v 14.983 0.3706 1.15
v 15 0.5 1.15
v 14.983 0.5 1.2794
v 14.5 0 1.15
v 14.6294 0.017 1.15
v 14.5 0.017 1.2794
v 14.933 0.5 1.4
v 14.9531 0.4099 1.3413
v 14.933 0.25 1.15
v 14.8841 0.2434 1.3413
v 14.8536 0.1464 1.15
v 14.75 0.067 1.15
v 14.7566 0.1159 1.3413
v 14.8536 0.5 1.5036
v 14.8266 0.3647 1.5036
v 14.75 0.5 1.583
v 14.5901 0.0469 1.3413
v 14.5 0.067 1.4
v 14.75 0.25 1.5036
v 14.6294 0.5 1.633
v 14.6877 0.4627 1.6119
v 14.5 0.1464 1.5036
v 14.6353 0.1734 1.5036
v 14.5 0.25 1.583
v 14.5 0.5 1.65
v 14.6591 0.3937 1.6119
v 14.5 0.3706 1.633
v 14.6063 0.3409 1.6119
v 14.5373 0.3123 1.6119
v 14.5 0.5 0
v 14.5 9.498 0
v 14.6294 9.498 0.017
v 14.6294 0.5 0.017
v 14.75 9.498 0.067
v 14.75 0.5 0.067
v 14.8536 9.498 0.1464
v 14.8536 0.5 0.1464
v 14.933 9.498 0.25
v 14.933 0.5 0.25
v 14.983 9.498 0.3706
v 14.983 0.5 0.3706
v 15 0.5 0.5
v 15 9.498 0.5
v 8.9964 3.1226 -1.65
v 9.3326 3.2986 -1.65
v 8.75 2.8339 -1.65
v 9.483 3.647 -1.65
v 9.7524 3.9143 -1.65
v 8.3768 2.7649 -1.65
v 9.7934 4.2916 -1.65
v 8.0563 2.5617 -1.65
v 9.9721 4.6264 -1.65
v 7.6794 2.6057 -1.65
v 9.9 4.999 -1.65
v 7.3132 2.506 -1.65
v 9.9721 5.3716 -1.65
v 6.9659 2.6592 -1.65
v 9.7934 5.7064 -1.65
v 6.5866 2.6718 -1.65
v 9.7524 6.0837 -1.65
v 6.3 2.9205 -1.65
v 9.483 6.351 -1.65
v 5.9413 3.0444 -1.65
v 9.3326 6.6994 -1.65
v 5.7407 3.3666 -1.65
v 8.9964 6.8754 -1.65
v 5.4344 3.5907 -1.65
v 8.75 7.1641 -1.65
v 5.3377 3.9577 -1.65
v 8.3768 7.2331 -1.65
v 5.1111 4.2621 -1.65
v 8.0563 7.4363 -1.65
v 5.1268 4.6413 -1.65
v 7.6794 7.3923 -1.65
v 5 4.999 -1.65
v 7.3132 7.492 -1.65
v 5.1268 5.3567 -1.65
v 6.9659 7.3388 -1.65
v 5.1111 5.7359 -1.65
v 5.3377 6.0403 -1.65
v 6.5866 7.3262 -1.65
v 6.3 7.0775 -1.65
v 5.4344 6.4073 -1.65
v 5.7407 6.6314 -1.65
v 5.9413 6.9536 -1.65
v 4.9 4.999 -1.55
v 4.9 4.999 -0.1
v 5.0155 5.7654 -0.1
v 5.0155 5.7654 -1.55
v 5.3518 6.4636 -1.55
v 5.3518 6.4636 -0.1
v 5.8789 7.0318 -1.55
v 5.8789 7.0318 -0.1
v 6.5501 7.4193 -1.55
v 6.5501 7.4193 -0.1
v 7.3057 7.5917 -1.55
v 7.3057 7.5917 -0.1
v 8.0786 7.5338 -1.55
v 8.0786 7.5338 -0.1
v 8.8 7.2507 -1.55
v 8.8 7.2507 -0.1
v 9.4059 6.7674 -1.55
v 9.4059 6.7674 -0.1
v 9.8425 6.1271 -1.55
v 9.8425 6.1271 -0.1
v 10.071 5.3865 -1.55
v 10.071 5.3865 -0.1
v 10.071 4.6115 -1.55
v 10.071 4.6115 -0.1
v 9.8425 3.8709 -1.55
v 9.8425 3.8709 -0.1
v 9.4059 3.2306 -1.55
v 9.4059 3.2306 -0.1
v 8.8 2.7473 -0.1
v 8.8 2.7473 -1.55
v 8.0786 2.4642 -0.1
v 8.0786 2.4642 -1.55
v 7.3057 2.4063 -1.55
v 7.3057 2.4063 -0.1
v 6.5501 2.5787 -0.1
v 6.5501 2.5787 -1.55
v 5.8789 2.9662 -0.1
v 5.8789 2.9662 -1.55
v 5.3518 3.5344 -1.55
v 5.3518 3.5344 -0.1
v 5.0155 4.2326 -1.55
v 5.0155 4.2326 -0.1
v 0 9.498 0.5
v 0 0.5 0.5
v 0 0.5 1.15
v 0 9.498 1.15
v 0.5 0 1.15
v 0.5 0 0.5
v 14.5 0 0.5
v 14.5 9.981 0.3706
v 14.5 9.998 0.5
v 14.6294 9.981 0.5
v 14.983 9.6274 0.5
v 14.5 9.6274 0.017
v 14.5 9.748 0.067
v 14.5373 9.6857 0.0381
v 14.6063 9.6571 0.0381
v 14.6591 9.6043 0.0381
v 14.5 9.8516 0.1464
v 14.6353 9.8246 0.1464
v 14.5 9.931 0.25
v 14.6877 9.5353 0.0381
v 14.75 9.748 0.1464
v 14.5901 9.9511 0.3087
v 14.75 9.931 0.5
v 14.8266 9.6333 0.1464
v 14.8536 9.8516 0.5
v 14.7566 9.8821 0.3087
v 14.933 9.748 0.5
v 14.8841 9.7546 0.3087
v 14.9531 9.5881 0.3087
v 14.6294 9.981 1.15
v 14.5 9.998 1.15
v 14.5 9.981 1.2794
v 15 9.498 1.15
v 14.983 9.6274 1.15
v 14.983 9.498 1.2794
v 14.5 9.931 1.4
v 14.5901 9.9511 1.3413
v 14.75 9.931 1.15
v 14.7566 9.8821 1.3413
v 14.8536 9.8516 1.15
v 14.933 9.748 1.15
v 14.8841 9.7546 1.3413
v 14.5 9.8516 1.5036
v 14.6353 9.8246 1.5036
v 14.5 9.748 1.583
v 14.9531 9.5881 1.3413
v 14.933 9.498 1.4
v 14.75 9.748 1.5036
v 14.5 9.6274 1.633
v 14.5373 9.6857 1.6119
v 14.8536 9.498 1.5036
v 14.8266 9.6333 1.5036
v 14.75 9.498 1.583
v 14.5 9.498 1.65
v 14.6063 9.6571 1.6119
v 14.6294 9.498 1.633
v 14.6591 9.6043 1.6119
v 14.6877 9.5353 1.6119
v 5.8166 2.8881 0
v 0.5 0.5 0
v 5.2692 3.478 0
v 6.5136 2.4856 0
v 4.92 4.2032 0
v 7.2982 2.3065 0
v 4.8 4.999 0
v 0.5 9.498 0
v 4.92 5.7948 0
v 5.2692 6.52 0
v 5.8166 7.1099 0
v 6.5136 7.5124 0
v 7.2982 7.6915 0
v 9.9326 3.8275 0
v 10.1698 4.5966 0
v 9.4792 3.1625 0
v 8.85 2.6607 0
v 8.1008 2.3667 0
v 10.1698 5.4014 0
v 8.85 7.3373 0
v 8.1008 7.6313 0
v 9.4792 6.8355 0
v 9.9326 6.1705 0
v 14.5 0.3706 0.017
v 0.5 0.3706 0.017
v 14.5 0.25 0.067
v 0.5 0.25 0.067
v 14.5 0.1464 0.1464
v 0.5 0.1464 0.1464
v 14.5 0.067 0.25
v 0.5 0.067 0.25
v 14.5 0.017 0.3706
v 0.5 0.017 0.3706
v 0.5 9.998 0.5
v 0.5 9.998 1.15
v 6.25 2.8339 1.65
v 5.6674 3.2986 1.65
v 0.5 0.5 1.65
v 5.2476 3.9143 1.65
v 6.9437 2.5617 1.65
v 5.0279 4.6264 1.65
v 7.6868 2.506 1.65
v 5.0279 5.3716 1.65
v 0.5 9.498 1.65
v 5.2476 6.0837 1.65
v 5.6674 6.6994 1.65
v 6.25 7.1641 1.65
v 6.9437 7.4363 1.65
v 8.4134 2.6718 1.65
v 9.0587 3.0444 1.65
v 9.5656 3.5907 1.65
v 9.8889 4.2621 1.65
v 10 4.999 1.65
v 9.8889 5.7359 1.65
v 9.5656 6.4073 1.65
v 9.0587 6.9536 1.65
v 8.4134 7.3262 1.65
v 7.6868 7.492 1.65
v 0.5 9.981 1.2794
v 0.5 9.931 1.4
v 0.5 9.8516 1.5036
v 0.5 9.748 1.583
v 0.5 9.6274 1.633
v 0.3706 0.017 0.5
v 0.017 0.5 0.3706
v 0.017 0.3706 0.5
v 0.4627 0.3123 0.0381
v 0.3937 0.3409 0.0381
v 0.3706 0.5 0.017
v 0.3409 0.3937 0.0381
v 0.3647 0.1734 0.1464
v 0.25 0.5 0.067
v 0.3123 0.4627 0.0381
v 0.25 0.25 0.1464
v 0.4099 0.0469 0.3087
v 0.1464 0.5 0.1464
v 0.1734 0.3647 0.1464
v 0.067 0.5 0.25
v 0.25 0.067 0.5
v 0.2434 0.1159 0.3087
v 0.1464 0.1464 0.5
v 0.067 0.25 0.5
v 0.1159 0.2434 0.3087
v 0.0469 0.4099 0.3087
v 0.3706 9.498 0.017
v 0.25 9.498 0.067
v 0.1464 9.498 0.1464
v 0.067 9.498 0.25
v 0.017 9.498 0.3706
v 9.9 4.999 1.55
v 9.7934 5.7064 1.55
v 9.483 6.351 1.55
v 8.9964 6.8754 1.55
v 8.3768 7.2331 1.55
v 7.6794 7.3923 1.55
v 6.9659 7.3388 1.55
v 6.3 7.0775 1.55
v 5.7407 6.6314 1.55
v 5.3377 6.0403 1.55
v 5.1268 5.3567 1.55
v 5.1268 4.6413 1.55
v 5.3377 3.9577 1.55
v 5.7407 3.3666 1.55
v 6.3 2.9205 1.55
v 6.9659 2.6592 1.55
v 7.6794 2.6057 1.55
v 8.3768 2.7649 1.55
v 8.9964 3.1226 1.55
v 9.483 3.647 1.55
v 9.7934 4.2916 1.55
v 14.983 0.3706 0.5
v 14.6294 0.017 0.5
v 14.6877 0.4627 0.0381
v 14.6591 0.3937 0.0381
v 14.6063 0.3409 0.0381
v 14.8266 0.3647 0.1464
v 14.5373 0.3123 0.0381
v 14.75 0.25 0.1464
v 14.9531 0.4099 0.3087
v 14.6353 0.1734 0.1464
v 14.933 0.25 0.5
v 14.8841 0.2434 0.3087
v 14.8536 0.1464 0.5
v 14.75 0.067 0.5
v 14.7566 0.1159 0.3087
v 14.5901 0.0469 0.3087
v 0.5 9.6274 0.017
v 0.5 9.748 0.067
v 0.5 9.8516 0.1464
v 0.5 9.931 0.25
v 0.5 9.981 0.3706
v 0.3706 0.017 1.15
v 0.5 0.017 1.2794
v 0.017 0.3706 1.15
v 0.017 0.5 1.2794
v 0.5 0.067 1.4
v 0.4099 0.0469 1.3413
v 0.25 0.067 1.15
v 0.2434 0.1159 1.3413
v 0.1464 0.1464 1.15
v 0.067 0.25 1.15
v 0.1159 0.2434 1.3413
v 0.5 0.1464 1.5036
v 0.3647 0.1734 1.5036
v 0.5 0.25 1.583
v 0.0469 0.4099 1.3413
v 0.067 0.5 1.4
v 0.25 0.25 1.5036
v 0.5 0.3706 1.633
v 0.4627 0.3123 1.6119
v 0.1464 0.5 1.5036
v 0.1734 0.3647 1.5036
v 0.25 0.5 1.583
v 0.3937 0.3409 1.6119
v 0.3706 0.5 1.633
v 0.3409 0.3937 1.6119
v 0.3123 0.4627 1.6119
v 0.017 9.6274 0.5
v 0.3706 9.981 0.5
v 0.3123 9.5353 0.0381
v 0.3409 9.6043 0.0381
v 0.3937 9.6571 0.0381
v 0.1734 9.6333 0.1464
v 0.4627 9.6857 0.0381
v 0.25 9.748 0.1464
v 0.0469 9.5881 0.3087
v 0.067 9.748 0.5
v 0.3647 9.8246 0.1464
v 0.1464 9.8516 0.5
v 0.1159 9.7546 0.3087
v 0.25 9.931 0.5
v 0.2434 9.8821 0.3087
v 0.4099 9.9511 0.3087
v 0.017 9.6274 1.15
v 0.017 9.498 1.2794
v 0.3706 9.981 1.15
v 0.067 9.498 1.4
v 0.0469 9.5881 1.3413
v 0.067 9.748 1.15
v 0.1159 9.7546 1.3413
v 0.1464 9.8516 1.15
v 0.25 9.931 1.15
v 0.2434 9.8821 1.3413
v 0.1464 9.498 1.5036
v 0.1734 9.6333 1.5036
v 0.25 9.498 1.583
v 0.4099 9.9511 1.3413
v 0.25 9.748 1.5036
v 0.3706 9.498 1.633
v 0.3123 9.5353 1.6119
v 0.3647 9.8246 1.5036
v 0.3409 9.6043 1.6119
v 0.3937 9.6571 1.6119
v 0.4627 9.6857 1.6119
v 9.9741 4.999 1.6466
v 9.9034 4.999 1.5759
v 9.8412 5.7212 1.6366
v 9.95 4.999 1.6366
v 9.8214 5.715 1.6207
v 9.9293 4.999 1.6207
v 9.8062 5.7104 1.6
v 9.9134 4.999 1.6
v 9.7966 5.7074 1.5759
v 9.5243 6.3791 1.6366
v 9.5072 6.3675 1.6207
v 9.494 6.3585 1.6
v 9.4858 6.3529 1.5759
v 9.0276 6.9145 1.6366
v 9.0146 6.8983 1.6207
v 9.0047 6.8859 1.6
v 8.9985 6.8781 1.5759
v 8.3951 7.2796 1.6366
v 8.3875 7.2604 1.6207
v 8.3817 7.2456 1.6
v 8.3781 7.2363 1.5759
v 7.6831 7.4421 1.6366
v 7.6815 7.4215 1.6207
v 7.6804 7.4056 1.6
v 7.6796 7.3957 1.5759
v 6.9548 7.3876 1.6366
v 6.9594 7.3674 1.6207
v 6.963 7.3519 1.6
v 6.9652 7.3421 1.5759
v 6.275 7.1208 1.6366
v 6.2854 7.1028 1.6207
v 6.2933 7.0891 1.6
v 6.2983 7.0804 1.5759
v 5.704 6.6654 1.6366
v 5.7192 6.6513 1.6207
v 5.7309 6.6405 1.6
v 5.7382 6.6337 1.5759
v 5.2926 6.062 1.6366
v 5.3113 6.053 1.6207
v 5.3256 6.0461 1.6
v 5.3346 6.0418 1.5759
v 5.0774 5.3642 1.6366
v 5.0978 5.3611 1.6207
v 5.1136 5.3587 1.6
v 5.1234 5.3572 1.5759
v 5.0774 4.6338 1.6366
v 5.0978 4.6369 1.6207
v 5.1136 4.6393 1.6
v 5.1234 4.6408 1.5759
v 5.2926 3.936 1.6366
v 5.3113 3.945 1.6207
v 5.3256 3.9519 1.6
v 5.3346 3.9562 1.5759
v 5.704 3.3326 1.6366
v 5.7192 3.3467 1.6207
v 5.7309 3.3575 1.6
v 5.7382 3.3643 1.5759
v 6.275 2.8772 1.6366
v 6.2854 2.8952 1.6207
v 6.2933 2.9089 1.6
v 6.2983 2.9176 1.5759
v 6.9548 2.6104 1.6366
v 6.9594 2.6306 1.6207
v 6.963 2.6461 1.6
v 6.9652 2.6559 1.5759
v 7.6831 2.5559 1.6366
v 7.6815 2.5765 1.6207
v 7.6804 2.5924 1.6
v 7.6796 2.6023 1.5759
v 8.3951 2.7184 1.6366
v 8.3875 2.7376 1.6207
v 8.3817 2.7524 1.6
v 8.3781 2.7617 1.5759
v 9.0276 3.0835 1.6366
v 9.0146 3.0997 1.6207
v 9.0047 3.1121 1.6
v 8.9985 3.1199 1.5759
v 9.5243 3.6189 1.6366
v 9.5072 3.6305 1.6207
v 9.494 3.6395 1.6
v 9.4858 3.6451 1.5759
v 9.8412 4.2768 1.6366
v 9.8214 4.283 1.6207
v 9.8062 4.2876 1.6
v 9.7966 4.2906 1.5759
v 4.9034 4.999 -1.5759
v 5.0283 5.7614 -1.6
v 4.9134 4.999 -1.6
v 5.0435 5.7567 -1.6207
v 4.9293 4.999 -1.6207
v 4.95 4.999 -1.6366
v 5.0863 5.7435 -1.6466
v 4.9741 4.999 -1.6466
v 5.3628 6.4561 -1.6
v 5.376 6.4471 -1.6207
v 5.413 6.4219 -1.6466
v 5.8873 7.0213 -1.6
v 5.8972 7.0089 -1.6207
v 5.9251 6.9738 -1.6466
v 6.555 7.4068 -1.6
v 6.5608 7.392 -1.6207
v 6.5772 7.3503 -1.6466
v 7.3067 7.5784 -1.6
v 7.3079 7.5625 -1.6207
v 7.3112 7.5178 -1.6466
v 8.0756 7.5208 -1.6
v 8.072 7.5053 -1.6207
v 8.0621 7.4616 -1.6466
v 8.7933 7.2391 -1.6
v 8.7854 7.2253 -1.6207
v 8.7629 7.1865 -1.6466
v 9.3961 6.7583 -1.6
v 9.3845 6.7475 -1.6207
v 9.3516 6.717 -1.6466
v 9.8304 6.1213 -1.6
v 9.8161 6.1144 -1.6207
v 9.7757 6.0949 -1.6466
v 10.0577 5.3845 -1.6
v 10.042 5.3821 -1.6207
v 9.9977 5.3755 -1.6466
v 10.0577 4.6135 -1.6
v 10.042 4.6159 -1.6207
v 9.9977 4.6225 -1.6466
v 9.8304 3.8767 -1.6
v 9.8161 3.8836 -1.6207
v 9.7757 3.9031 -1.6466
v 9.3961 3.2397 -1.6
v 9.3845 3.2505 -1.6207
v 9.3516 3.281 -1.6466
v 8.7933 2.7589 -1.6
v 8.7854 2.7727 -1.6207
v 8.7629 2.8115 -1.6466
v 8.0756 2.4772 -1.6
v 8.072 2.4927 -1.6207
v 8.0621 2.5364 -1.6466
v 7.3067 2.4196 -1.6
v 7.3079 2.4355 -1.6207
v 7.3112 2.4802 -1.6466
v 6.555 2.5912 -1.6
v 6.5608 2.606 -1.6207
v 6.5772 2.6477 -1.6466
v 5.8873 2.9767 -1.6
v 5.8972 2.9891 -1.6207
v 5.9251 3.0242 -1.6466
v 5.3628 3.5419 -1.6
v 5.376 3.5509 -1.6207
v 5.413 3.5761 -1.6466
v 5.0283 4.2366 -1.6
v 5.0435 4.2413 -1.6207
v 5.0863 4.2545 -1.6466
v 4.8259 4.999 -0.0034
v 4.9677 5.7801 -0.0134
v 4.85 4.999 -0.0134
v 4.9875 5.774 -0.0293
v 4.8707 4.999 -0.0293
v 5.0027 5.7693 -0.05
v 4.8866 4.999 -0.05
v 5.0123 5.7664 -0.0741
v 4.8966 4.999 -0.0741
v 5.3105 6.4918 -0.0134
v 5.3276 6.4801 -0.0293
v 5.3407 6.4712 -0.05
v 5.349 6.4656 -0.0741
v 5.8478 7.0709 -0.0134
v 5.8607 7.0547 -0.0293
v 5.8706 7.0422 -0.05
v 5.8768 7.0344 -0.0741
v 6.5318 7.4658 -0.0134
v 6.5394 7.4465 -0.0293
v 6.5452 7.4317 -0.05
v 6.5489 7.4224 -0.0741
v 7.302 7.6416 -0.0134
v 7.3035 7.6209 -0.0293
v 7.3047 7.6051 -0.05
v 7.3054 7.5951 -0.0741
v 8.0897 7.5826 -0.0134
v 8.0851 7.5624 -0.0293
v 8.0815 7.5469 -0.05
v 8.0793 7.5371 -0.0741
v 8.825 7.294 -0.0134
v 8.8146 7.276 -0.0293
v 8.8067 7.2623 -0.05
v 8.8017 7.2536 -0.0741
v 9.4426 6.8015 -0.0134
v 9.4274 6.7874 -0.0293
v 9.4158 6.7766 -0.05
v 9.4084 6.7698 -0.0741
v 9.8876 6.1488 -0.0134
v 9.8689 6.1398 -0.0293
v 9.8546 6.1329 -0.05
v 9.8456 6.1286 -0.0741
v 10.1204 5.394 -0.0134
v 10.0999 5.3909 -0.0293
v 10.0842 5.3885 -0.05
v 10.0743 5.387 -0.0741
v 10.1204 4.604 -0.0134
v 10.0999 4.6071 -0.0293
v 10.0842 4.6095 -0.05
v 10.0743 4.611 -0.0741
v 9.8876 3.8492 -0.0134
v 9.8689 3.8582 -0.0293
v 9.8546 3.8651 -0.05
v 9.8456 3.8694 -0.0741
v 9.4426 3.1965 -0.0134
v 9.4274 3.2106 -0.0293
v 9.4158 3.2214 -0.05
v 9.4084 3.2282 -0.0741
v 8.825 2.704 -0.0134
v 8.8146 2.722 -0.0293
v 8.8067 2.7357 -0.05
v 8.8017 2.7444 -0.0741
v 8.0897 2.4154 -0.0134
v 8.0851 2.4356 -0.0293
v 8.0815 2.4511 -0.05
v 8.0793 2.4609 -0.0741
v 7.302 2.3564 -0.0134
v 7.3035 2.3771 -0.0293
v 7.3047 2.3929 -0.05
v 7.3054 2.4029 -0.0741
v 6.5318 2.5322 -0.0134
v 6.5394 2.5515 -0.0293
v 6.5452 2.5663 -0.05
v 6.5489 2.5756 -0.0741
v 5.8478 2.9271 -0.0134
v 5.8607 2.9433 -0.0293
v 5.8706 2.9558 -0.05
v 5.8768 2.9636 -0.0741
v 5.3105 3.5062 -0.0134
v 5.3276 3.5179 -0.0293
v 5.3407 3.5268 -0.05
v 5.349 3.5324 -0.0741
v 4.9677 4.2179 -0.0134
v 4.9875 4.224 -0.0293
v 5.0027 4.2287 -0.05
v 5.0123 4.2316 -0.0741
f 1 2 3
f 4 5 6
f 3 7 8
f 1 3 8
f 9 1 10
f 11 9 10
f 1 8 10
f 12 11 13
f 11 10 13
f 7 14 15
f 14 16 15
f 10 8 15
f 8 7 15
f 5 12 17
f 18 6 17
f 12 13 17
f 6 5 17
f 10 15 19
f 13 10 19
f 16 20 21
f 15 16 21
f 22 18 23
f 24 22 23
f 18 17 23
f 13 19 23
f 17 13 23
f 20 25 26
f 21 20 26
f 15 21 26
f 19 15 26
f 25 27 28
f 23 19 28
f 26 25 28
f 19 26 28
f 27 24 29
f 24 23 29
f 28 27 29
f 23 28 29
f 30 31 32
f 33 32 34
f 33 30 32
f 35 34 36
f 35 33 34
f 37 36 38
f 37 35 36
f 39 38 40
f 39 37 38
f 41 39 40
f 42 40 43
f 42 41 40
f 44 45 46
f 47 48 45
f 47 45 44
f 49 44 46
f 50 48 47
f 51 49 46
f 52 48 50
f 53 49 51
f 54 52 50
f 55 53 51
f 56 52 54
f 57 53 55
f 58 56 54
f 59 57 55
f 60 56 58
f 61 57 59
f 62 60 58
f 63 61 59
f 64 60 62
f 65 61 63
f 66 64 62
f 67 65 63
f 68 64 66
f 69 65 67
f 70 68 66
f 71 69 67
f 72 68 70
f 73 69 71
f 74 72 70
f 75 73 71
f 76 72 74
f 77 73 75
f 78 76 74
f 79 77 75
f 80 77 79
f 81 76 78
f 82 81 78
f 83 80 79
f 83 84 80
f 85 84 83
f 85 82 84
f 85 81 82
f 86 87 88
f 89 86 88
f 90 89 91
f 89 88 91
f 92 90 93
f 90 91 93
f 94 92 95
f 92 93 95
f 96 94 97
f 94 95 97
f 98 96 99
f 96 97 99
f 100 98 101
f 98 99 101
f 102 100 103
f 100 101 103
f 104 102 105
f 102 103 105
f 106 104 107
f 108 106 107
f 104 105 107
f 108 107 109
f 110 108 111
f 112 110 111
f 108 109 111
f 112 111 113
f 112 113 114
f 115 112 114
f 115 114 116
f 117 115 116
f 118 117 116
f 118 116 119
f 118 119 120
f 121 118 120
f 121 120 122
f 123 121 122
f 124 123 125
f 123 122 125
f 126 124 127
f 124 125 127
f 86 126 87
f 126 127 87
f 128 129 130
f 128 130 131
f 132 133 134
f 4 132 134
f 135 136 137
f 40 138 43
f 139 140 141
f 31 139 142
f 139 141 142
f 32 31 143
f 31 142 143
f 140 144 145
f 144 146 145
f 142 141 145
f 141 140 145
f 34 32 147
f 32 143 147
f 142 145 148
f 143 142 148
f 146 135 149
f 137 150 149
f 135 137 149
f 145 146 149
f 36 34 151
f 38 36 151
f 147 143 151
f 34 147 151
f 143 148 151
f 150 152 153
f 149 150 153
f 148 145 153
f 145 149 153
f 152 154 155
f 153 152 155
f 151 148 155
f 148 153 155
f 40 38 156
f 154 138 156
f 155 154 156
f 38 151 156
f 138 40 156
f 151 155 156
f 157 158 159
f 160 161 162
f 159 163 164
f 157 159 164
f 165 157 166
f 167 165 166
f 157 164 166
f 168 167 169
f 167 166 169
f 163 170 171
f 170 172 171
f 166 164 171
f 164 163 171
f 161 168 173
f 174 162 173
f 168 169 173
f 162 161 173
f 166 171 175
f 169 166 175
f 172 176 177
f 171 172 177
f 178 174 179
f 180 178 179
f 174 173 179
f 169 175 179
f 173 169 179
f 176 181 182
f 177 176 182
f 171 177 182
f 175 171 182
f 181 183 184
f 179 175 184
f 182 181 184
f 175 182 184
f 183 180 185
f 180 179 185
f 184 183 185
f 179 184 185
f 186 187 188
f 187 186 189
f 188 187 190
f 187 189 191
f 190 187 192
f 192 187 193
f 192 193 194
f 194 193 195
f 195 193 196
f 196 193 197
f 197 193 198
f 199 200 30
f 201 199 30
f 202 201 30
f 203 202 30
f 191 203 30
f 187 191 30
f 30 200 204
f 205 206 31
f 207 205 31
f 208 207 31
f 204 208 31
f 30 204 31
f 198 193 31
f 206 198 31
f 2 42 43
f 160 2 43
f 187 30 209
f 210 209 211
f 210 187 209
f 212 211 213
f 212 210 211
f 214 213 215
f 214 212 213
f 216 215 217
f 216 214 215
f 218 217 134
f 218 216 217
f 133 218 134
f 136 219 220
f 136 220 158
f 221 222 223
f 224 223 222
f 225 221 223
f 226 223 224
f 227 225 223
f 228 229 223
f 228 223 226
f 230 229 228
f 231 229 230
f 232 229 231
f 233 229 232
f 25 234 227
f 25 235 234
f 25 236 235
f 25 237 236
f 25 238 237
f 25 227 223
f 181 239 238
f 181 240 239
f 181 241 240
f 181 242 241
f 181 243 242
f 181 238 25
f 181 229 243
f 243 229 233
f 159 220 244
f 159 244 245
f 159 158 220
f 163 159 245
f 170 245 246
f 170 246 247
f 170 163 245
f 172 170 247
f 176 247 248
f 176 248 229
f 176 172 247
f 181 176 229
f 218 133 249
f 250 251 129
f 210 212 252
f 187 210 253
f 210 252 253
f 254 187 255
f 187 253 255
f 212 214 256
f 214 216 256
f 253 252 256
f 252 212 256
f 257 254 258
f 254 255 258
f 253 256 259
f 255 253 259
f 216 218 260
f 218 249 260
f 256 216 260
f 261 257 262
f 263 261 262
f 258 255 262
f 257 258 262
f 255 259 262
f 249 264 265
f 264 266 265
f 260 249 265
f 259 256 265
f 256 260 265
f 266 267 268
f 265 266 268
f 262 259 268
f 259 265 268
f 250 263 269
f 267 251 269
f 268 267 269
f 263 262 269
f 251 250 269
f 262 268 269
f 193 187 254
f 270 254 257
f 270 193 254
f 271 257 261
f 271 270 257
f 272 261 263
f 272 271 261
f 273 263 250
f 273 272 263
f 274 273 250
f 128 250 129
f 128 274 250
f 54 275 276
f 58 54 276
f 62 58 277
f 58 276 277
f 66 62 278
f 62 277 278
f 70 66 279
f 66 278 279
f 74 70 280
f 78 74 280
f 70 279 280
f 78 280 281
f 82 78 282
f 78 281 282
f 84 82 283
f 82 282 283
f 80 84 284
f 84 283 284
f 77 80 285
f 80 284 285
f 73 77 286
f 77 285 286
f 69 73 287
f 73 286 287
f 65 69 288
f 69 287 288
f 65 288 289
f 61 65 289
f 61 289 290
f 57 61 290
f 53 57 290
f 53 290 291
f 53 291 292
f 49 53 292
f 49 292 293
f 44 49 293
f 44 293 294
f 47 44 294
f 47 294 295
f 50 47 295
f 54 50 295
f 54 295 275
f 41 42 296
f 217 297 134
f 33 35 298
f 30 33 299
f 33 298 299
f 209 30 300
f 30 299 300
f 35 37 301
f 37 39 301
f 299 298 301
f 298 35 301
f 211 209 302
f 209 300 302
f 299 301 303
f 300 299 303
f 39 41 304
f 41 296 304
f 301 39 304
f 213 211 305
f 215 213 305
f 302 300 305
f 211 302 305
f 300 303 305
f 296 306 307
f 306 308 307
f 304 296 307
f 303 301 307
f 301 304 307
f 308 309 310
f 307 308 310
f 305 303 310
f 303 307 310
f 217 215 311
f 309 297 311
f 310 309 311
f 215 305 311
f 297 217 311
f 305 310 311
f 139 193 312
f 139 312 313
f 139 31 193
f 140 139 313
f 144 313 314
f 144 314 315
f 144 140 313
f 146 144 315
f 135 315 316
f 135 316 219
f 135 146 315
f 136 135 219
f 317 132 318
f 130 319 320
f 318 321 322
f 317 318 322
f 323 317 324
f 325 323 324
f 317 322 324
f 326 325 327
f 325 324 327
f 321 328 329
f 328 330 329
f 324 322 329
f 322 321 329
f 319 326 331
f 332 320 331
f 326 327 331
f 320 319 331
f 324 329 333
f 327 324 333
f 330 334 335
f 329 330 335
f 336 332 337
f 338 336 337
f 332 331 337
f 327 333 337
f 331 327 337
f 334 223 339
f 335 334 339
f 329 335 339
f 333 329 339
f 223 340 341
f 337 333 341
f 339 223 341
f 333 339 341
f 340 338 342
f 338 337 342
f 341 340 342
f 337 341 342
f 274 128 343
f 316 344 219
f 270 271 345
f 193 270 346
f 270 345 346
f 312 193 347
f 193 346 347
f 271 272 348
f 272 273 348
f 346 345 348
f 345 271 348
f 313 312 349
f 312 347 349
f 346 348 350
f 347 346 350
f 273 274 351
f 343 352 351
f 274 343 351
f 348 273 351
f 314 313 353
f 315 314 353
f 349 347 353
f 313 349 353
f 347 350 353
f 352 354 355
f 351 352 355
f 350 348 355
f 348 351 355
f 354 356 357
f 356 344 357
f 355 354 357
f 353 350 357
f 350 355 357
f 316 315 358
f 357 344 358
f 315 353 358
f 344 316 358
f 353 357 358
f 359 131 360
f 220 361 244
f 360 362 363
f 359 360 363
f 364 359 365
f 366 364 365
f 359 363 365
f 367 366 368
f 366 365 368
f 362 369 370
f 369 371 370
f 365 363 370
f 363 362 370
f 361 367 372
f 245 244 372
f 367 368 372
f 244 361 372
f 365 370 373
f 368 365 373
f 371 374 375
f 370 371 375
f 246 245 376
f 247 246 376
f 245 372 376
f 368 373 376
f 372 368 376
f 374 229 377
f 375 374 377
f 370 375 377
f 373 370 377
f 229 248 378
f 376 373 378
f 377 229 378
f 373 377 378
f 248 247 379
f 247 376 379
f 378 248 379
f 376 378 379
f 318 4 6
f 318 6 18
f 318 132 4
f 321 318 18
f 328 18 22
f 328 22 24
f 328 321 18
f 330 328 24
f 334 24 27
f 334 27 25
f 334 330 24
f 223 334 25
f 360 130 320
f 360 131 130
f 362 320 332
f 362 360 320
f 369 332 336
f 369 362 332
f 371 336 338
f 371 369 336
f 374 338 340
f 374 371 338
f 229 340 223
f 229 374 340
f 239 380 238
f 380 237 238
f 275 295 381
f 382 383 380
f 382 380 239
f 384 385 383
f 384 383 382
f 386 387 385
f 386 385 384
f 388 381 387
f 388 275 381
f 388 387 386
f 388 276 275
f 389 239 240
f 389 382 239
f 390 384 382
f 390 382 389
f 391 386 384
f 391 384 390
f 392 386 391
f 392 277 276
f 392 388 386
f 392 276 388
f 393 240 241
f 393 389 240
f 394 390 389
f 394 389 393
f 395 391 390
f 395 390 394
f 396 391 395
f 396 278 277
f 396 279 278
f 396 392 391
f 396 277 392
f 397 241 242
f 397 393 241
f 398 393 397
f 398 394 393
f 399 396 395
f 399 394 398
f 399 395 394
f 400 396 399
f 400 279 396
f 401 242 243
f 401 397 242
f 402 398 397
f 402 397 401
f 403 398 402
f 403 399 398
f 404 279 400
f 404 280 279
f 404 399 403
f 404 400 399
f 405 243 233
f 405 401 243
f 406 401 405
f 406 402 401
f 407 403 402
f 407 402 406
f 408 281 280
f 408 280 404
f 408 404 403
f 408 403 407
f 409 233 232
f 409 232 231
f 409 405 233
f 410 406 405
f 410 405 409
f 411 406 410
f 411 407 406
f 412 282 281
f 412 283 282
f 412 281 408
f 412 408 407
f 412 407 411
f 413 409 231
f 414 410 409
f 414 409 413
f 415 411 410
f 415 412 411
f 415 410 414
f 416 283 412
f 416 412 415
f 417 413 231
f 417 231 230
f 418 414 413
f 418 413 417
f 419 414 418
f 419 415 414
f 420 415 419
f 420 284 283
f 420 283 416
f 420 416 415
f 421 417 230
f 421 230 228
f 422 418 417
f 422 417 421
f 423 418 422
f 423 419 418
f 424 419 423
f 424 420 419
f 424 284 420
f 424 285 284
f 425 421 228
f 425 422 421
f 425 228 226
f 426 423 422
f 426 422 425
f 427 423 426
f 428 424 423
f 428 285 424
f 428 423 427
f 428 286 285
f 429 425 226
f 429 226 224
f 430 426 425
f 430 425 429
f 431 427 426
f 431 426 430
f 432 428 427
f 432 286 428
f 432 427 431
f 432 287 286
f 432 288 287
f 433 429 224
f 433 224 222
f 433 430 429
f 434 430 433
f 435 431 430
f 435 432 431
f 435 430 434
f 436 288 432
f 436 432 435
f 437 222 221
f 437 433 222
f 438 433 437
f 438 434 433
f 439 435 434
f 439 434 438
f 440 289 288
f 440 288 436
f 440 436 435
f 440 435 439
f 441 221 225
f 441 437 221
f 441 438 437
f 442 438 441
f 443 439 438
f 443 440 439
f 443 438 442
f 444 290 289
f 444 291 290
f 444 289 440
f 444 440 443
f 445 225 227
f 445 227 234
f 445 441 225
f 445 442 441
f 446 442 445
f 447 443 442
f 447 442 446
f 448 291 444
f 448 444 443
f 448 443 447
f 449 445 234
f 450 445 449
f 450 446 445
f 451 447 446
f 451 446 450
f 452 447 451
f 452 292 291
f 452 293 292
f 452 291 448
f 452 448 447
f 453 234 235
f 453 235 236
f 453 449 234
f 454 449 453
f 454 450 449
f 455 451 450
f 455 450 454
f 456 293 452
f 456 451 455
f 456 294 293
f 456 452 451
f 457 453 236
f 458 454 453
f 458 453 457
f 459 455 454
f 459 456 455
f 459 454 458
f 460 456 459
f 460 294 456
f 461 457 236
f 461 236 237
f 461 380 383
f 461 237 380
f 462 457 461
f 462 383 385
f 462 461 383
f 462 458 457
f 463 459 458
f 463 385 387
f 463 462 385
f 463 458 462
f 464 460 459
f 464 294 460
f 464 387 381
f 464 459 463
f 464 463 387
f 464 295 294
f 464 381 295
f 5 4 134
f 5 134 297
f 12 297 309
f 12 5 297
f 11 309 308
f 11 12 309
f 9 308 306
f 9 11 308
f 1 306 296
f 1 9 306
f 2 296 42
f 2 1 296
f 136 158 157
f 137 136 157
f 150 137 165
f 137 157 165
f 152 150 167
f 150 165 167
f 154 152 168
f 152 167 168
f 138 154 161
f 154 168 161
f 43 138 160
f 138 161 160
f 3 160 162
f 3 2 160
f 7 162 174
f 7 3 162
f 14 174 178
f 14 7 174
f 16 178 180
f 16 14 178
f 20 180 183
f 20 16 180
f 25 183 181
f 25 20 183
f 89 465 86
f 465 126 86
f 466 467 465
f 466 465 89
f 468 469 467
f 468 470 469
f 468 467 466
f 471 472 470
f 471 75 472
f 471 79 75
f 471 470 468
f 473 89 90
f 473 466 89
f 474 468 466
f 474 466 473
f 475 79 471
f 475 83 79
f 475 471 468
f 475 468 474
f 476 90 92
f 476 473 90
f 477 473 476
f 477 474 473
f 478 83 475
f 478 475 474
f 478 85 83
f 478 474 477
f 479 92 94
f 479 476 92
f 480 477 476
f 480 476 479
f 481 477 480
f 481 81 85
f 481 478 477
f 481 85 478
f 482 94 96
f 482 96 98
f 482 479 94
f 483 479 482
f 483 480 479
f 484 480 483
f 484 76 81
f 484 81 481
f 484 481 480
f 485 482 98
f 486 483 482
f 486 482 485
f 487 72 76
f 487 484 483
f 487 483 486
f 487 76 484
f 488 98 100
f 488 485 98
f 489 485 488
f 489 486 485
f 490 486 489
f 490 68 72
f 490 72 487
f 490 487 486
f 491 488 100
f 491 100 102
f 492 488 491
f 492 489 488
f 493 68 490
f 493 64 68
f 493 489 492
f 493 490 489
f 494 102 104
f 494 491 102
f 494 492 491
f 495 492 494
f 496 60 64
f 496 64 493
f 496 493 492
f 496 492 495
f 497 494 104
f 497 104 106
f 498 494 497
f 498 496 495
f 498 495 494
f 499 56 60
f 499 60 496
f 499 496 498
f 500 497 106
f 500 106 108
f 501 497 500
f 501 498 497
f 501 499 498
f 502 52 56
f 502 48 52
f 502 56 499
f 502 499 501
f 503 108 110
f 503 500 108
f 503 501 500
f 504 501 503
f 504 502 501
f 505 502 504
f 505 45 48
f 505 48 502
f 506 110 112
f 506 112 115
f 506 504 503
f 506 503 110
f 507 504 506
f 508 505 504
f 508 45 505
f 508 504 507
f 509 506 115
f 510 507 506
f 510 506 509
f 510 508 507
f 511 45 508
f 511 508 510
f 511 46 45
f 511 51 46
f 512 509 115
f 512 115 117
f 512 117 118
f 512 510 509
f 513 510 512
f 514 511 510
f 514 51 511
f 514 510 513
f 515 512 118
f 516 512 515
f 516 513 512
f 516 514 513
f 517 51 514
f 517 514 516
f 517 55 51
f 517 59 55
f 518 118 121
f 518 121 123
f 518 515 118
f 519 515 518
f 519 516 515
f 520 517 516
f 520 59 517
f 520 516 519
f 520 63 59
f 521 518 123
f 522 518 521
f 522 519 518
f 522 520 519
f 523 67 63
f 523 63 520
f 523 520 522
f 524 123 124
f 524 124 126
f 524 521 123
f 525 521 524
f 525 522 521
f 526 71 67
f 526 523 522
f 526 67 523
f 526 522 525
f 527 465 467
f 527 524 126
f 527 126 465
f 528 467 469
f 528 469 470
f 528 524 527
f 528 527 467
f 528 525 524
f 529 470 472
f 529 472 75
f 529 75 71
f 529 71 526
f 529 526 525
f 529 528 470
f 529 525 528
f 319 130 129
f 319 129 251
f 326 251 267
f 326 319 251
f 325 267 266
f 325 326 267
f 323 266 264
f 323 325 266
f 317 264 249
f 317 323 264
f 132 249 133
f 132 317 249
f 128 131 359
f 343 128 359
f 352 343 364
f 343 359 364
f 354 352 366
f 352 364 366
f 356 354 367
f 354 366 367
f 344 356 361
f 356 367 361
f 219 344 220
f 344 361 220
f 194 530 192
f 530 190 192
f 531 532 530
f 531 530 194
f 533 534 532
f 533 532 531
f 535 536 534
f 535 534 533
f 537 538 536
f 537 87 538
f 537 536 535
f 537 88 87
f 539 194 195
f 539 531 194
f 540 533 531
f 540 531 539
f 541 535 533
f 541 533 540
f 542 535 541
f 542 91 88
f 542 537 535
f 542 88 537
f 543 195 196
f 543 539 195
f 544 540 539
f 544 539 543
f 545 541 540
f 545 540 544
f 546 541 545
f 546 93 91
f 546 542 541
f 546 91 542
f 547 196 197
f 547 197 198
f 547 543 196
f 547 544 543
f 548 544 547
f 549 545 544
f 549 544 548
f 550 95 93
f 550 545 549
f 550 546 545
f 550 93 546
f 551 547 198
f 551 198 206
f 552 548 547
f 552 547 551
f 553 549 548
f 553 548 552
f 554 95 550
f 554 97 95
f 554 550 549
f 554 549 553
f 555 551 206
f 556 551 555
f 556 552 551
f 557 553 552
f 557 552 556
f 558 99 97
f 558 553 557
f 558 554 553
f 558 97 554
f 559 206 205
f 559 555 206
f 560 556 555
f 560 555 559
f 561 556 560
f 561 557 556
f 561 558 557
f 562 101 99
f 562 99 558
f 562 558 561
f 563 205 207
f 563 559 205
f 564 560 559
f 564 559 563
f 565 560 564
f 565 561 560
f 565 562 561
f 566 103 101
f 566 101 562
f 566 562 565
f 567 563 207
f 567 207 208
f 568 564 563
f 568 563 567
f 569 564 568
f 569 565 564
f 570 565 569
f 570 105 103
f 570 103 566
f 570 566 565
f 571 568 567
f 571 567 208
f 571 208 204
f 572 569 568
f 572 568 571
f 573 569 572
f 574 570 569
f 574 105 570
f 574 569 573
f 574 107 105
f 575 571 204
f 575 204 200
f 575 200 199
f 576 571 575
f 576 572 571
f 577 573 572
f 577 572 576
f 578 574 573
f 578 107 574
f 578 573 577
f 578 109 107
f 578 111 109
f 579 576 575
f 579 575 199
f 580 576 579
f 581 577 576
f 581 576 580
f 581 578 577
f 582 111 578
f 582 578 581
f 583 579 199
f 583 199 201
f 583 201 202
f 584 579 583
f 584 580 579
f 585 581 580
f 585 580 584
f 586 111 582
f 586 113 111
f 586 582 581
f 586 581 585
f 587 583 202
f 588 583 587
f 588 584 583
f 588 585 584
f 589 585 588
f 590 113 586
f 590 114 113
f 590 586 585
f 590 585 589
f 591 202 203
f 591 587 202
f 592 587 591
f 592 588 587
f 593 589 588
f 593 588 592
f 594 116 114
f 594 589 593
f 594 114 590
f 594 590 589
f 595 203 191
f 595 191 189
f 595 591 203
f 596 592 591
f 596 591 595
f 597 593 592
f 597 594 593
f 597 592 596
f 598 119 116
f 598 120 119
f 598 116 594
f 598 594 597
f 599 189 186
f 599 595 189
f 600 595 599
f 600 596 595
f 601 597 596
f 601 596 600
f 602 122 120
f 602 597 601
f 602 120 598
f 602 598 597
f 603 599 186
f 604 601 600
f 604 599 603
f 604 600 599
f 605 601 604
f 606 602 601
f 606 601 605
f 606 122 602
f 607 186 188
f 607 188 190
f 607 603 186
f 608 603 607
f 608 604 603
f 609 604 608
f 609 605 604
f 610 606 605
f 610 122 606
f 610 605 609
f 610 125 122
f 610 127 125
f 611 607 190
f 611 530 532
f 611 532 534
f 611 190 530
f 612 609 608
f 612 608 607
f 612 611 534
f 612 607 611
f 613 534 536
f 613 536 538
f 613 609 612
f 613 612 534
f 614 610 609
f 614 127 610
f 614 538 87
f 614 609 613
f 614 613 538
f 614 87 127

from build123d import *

# Parameters (mm, degrees)
SKETCH1_W           = 15
SKETCH1_H           = 9.998
BOSS_EXTRUDE1_DEPTH = 1.65
SKETCH2_R           = 2.6
BOSS_EXTRUDE2_DEPTH = 1.65
SKETCH3_R           = 2.4
CUT_EXTRUDE1_DEPTH  = 4.3
FILLET1_R           = 0.1
FILLET3_R           = 0.5
FILLET4_R           = 0.5


with BuildPart() as part:
    # Sketch1 → Boss-Extrude1 (new body)
    with BuildSketch(Plane.XY):
        with Locations((7.5, 4.999)):
            Rectangle(SKETCH1_W, SKETCH1_H)
    extrude(amount=BOSS_EXTRUDE1_DEPTH)

    # Sketch2 → Boss-Extrude2 (add)
    with BuildSketch(Plane(origin=(0, 0, 0), x_dir=(-1, 0, 0), z_dir=(0, 0, -1))):
        with Locations((-7.5, 4.999)):
            Circle(SKETCH2_R)
    extrude(amount=BOSS_EXTRUDE2_DEPTH)

    # Sketch3 → Cut-Extrude1 (cut, through all)
    with BuildSketch(Plane.XY.offset(1.65)):
        with Locations((7.5, 4.999)):
            Circle(SKETCH3_R)
    extrude(amount=-CUT_EXTRUDE1_DEPTH, mode=Mode.SUBTRACT)

    # Fillet1
    fillet1_edges = [part.edges().sort_by_distance(p)[0] for p in [
        (10.1, 4.999, 0),
        (10.1, 4.999, -1.65),
        (5.1, 4.999, 1.65),
    ]]
    fillet(fillet1_edges, radius=FILLET1_R)

    # Fillet3
    fillet3_edges = [part.edges().sort_by_distance(p)[0] for p in [
        (0, 0, 0.825),
        (0, 9.998, 0.825),
        (15, 9.998, 0.825),
        (15, 0, 0.825),
    ]]
    fillet(fillet3_edges, radius=FILLET3_R)

    # Fillet4
    fillet4_edges = [part.edges().sort_by_distance(p)[0] for p in [
        (7.5, 9.998, 0),
        (7.5, 9.998, 1.65),
        (7.5, 0, 0),
        (0, 4.999, 0),
        (15, 4.999, 0),
        (0.146446609, 0.146446609, 0),
        (0.146446609, 9.851553391, 0),
        (14.853553391, 0.146446609, 0),
        (14.853553391, 9.851553391, 0),
        (15, 4.999, 1.65),
        (7.5, 0, 1.65),
        (0, 4.999, 1.65),
        (0.146446609, 0.146446609, 1.65),
        (0.146446609, 9.851553391, 1.65),
        (14.853553391, 0.146446609, 1.65),
        (14.853553391, 9.851553391, 1.65),
    ]]
    fillet(fillet4_edges, radius=FILLET4_R)


solid = part.part
